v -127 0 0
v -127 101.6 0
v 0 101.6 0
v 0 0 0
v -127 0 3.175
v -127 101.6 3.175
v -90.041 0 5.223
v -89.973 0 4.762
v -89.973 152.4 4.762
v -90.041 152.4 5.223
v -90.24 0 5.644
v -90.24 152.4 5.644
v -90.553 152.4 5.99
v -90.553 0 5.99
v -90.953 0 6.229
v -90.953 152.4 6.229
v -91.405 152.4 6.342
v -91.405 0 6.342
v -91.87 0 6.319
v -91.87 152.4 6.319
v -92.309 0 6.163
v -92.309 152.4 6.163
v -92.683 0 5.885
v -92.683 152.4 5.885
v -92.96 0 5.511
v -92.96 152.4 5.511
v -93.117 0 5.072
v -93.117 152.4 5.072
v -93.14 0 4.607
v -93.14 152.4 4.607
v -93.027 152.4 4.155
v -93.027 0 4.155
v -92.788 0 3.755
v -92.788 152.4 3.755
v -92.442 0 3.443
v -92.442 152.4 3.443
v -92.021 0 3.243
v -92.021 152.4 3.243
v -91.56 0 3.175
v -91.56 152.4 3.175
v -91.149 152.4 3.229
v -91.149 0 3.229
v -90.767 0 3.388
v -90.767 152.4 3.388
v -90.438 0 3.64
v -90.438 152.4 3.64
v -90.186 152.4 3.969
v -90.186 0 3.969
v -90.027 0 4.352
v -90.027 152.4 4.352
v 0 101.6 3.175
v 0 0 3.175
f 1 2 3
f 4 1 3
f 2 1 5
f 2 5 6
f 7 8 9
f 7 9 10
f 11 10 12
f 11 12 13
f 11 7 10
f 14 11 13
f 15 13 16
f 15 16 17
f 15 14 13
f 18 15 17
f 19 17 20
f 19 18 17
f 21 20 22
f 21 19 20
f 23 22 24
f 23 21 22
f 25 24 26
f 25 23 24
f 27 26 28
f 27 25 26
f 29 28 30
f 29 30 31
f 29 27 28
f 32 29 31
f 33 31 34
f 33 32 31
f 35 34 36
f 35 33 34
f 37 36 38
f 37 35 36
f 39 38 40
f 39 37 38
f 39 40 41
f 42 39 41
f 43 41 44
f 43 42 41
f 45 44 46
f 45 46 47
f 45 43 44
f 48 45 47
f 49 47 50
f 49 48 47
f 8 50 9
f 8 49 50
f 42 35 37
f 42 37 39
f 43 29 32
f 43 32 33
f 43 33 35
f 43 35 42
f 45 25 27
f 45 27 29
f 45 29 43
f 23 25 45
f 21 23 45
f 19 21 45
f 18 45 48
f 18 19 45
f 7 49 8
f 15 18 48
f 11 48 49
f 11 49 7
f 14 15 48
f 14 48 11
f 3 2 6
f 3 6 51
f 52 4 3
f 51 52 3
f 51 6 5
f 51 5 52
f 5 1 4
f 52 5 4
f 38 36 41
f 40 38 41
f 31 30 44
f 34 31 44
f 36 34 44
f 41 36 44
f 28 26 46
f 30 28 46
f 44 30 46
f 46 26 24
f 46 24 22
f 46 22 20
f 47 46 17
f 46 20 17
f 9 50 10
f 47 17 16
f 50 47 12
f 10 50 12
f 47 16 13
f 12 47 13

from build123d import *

# Parameters (mm, degrees)
F0_W     = 127
F0_H     = 101.6
F1_DEPTH = 3.175
F3_DEPTH = 152.4


with BuildPart() as f1:
    # F0 (on Top) → F1 (new body)
    with BuildSketch(Plane.XY):
        with Locations((-63.5, 50.8)):
            Rectangle(F0_W, F0_H)
    extrude(amount=F1_DEPTH)


with BuildPart() as f3:
    # F2 (on face) → F3 (new body)
    with BuildSketch(Plane.XZ):
        with BuildLine():
            ThreePointArc((-91.560364, 3.175), (-90.437832, 3.639968), (-89.972864, 4.7625))
            ThreePointArc((-89.972864, 4.7625), (-92.682896, 5.885032), (-91.560364, 3.175))
        make_face()
    extrude(amount=-F3_DEPTH)


solid = Compound([f1.part, f3.part])
